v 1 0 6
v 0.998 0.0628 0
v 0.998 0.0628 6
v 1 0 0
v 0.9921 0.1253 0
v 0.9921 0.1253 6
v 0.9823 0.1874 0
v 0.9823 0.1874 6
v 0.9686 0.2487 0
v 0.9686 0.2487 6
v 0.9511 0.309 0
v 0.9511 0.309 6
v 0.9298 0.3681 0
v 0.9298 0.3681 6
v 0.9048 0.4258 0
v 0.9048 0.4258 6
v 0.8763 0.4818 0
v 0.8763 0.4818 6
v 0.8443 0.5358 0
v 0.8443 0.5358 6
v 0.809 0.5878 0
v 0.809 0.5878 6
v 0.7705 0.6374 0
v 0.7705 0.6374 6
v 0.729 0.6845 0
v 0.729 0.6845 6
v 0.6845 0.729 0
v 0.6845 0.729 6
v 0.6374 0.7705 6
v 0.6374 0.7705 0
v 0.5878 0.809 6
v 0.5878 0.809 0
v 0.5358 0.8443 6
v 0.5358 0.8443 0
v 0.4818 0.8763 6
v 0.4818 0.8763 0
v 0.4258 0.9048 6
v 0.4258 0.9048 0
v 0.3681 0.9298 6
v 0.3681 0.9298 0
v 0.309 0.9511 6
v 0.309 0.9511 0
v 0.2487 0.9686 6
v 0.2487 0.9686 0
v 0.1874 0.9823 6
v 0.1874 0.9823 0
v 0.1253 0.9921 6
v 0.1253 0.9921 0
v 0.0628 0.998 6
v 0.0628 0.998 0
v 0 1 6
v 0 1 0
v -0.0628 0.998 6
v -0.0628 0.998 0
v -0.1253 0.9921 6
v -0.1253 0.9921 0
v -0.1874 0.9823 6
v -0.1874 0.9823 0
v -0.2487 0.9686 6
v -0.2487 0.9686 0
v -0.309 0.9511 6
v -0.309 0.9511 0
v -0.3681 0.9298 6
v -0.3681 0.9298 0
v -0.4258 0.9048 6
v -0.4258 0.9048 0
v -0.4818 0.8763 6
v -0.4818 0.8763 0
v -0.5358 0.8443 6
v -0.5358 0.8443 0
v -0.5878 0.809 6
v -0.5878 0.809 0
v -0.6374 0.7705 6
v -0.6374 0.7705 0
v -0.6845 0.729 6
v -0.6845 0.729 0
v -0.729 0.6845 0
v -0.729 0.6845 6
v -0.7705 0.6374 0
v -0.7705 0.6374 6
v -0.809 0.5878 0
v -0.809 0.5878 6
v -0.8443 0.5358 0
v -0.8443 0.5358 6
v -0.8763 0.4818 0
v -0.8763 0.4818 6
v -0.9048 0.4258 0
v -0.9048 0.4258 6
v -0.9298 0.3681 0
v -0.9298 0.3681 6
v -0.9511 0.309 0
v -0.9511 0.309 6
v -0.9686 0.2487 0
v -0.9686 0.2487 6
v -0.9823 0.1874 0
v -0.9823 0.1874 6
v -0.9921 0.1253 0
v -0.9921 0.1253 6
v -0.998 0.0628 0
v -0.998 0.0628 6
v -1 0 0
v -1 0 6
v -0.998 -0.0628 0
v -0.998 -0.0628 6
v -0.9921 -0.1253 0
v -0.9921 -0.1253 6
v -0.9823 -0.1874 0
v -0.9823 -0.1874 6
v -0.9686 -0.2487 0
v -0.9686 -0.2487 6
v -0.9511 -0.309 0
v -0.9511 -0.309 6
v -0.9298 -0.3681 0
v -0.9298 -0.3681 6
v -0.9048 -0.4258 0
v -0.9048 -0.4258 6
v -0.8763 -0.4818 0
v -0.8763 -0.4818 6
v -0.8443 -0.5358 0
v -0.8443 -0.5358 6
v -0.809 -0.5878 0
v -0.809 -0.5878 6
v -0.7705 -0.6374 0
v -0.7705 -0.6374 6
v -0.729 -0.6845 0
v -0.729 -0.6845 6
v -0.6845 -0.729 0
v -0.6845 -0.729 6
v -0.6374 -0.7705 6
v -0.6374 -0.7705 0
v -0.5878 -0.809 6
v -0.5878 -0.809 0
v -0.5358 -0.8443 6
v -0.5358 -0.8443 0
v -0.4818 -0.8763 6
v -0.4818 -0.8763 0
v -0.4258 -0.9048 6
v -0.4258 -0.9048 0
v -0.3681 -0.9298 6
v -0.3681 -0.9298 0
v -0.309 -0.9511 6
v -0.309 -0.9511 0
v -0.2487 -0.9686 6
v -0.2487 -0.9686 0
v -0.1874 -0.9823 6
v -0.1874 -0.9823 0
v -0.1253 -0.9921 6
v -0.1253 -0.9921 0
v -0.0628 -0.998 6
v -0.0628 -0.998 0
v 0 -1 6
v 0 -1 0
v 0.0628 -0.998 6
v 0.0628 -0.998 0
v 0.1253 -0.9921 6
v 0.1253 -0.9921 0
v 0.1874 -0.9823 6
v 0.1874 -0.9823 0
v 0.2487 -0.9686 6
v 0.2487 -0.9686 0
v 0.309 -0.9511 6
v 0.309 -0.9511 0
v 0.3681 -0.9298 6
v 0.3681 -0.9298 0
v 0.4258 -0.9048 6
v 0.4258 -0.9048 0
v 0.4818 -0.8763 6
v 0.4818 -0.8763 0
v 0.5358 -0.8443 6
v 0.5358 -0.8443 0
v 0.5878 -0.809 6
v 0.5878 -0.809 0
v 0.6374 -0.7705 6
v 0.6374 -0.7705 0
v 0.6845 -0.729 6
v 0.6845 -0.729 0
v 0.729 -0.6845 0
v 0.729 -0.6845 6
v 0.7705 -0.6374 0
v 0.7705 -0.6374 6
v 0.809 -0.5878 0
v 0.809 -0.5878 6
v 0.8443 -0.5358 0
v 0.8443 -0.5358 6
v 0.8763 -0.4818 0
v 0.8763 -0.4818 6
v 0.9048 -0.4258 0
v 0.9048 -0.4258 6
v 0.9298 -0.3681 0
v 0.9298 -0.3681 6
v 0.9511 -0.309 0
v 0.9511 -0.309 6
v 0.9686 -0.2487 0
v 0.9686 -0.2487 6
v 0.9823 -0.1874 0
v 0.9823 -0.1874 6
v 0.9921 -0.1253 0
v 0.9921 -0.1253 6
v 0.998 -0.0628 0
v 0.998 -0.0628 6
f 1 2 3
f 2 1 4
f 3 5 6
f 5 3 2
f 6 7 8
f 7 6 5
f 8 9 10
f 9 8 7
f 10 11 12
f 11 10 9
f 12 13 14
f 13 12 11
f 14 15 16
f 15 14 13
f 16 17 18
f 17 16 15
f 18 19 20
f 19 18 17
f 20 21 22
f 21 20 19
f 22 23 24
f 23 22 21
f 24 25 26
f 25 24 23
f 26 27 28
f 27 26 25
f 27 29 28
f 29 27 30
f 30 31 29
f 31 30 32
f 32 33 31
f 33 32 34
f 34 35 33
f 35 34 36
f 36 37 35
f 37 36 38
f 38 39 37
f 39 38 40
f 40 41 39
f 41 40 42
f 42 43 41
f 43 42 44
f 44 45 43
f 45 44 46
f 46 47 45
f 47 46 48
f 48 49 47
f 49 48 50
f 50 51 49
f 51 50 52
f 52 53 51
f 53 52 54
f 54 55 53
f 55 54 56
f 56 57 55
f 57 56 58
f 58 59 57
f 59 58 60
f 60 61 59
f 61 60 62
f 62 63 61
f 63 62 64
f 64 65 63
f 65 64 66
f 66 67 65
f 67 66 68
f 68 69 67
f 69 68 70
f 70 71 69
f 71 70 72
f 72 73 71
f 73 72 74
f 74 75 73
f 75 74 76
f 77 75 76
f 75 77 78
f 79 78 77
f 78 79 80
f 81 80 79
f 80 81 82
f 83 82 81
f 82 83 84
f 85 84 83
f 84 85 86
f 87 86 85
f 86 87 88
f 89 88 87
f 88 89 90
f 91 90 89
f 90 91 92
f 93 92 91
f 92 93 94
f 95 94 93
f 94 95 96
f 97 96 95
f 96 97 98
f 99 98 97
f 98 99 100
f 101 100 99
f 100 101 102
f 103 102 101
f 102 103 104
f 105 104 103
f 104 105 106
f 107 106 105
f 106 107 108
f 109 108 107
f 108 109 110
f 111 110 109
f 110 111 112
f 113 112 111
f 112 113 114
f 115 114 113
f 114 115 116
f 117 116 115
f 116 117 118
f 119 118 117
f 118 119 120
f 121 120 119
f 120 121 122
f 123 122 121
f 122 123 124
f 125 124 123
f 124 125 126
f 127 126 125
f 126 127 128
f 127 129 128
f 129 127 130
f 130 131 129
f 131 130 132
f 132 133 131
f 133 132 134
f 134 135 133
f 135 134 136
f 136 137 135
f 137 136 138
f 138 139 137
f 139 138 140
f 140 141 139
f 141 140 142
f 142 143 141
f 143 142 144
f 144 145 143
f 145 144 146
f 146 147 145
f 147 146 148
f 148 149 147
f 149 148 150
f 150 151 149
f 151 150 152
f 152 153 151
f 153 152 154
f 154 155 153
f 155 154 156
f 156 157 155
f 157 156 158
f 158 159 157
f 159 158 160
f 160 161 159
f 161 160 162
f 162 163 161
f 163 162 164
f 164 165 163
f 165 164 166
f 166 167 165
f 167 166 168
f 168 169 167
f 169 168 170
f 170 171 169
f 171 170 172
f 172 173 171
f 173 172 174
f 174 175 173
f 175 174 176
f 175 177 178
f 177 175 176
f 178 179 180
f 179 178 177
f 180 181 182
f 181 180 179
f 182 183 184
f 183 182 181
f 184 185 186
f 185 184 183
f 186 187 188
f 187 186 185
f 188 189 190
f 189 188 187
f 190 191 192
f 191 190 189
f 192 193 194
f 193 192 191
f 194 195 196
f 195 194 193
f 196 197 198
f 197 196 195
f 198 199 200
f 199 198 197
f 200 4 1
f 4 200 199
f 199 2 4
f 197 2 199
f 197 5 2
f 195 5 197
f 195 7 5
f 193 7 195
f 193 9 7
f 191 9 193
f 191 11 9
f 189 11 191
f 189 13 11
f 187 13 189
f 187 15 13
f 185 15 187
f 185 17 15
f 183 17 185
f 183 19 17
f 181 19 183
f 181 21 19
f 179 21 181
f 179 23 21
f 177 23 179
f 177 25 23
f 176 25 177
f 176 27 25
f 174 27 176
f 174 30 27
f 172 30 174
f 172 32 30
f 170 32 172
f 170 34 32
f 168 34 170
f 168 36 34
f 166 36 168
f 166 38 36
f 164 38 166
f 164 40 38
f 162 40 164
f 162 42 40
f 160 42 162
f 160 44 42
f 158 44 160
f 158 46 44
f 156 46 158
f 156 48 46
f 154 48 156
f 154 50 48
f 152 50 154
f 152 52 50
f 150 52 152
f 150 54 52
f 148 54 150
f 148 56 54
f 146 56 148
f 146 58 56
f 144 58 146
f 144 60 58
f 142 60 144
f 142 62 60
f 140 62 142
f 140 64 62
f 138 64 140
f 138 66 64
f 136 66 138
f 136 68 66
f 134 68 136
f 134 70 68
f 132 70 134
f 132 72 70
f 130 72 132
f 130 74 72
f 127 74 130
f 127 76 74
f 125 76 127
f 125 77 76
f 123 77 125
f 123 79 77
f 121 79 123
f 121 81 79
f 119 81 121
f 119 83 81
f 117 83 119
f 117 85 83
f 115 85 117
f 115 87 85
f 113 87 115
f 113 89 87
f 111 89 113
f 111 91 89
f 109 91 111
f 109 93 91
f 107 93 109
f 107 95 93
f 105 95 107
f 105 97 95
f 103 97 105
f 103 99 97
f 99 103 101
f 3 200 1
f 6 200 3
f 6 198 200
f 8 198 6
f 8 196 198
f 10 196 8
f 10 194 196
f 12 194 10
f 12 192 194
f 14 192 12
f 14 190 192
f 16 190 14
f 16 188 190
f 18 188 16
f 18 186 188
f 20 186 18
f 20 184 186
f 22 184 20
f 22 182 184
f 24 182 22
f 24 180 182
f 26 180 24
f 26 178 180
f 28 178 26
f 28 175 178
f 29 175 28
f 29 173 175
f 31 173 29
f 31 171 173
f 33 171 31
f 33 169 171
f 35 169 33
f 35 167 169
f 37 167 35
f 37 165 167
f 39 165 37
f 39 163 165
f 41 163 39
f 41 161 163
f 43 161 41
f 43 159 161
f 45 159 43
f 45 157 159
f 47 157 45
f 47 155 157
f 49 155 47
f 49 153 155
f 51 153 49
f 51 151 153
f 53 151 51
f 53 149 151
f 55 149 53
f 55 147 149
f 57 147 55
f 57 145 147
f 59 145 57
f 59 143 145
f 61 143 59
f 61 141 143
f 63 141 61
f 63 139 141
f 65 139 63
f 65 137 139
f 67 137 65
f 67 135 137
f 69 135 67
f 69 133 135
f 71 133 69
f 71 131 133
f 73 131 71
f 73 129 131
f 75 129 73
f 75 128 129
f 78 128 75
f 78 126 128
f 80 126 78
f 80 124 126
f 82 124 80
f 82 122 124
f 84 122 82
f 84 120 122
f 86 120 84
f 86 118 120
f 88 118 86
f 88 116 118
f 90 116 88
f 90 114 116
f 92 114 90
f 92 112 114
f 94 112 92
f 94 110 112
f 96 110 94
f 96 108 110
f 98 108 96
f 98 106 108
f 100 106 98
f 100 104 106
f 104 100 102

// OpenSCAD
radius = 1;
length = 6;

cylinder(h = length, r = radius, $fn=100);
